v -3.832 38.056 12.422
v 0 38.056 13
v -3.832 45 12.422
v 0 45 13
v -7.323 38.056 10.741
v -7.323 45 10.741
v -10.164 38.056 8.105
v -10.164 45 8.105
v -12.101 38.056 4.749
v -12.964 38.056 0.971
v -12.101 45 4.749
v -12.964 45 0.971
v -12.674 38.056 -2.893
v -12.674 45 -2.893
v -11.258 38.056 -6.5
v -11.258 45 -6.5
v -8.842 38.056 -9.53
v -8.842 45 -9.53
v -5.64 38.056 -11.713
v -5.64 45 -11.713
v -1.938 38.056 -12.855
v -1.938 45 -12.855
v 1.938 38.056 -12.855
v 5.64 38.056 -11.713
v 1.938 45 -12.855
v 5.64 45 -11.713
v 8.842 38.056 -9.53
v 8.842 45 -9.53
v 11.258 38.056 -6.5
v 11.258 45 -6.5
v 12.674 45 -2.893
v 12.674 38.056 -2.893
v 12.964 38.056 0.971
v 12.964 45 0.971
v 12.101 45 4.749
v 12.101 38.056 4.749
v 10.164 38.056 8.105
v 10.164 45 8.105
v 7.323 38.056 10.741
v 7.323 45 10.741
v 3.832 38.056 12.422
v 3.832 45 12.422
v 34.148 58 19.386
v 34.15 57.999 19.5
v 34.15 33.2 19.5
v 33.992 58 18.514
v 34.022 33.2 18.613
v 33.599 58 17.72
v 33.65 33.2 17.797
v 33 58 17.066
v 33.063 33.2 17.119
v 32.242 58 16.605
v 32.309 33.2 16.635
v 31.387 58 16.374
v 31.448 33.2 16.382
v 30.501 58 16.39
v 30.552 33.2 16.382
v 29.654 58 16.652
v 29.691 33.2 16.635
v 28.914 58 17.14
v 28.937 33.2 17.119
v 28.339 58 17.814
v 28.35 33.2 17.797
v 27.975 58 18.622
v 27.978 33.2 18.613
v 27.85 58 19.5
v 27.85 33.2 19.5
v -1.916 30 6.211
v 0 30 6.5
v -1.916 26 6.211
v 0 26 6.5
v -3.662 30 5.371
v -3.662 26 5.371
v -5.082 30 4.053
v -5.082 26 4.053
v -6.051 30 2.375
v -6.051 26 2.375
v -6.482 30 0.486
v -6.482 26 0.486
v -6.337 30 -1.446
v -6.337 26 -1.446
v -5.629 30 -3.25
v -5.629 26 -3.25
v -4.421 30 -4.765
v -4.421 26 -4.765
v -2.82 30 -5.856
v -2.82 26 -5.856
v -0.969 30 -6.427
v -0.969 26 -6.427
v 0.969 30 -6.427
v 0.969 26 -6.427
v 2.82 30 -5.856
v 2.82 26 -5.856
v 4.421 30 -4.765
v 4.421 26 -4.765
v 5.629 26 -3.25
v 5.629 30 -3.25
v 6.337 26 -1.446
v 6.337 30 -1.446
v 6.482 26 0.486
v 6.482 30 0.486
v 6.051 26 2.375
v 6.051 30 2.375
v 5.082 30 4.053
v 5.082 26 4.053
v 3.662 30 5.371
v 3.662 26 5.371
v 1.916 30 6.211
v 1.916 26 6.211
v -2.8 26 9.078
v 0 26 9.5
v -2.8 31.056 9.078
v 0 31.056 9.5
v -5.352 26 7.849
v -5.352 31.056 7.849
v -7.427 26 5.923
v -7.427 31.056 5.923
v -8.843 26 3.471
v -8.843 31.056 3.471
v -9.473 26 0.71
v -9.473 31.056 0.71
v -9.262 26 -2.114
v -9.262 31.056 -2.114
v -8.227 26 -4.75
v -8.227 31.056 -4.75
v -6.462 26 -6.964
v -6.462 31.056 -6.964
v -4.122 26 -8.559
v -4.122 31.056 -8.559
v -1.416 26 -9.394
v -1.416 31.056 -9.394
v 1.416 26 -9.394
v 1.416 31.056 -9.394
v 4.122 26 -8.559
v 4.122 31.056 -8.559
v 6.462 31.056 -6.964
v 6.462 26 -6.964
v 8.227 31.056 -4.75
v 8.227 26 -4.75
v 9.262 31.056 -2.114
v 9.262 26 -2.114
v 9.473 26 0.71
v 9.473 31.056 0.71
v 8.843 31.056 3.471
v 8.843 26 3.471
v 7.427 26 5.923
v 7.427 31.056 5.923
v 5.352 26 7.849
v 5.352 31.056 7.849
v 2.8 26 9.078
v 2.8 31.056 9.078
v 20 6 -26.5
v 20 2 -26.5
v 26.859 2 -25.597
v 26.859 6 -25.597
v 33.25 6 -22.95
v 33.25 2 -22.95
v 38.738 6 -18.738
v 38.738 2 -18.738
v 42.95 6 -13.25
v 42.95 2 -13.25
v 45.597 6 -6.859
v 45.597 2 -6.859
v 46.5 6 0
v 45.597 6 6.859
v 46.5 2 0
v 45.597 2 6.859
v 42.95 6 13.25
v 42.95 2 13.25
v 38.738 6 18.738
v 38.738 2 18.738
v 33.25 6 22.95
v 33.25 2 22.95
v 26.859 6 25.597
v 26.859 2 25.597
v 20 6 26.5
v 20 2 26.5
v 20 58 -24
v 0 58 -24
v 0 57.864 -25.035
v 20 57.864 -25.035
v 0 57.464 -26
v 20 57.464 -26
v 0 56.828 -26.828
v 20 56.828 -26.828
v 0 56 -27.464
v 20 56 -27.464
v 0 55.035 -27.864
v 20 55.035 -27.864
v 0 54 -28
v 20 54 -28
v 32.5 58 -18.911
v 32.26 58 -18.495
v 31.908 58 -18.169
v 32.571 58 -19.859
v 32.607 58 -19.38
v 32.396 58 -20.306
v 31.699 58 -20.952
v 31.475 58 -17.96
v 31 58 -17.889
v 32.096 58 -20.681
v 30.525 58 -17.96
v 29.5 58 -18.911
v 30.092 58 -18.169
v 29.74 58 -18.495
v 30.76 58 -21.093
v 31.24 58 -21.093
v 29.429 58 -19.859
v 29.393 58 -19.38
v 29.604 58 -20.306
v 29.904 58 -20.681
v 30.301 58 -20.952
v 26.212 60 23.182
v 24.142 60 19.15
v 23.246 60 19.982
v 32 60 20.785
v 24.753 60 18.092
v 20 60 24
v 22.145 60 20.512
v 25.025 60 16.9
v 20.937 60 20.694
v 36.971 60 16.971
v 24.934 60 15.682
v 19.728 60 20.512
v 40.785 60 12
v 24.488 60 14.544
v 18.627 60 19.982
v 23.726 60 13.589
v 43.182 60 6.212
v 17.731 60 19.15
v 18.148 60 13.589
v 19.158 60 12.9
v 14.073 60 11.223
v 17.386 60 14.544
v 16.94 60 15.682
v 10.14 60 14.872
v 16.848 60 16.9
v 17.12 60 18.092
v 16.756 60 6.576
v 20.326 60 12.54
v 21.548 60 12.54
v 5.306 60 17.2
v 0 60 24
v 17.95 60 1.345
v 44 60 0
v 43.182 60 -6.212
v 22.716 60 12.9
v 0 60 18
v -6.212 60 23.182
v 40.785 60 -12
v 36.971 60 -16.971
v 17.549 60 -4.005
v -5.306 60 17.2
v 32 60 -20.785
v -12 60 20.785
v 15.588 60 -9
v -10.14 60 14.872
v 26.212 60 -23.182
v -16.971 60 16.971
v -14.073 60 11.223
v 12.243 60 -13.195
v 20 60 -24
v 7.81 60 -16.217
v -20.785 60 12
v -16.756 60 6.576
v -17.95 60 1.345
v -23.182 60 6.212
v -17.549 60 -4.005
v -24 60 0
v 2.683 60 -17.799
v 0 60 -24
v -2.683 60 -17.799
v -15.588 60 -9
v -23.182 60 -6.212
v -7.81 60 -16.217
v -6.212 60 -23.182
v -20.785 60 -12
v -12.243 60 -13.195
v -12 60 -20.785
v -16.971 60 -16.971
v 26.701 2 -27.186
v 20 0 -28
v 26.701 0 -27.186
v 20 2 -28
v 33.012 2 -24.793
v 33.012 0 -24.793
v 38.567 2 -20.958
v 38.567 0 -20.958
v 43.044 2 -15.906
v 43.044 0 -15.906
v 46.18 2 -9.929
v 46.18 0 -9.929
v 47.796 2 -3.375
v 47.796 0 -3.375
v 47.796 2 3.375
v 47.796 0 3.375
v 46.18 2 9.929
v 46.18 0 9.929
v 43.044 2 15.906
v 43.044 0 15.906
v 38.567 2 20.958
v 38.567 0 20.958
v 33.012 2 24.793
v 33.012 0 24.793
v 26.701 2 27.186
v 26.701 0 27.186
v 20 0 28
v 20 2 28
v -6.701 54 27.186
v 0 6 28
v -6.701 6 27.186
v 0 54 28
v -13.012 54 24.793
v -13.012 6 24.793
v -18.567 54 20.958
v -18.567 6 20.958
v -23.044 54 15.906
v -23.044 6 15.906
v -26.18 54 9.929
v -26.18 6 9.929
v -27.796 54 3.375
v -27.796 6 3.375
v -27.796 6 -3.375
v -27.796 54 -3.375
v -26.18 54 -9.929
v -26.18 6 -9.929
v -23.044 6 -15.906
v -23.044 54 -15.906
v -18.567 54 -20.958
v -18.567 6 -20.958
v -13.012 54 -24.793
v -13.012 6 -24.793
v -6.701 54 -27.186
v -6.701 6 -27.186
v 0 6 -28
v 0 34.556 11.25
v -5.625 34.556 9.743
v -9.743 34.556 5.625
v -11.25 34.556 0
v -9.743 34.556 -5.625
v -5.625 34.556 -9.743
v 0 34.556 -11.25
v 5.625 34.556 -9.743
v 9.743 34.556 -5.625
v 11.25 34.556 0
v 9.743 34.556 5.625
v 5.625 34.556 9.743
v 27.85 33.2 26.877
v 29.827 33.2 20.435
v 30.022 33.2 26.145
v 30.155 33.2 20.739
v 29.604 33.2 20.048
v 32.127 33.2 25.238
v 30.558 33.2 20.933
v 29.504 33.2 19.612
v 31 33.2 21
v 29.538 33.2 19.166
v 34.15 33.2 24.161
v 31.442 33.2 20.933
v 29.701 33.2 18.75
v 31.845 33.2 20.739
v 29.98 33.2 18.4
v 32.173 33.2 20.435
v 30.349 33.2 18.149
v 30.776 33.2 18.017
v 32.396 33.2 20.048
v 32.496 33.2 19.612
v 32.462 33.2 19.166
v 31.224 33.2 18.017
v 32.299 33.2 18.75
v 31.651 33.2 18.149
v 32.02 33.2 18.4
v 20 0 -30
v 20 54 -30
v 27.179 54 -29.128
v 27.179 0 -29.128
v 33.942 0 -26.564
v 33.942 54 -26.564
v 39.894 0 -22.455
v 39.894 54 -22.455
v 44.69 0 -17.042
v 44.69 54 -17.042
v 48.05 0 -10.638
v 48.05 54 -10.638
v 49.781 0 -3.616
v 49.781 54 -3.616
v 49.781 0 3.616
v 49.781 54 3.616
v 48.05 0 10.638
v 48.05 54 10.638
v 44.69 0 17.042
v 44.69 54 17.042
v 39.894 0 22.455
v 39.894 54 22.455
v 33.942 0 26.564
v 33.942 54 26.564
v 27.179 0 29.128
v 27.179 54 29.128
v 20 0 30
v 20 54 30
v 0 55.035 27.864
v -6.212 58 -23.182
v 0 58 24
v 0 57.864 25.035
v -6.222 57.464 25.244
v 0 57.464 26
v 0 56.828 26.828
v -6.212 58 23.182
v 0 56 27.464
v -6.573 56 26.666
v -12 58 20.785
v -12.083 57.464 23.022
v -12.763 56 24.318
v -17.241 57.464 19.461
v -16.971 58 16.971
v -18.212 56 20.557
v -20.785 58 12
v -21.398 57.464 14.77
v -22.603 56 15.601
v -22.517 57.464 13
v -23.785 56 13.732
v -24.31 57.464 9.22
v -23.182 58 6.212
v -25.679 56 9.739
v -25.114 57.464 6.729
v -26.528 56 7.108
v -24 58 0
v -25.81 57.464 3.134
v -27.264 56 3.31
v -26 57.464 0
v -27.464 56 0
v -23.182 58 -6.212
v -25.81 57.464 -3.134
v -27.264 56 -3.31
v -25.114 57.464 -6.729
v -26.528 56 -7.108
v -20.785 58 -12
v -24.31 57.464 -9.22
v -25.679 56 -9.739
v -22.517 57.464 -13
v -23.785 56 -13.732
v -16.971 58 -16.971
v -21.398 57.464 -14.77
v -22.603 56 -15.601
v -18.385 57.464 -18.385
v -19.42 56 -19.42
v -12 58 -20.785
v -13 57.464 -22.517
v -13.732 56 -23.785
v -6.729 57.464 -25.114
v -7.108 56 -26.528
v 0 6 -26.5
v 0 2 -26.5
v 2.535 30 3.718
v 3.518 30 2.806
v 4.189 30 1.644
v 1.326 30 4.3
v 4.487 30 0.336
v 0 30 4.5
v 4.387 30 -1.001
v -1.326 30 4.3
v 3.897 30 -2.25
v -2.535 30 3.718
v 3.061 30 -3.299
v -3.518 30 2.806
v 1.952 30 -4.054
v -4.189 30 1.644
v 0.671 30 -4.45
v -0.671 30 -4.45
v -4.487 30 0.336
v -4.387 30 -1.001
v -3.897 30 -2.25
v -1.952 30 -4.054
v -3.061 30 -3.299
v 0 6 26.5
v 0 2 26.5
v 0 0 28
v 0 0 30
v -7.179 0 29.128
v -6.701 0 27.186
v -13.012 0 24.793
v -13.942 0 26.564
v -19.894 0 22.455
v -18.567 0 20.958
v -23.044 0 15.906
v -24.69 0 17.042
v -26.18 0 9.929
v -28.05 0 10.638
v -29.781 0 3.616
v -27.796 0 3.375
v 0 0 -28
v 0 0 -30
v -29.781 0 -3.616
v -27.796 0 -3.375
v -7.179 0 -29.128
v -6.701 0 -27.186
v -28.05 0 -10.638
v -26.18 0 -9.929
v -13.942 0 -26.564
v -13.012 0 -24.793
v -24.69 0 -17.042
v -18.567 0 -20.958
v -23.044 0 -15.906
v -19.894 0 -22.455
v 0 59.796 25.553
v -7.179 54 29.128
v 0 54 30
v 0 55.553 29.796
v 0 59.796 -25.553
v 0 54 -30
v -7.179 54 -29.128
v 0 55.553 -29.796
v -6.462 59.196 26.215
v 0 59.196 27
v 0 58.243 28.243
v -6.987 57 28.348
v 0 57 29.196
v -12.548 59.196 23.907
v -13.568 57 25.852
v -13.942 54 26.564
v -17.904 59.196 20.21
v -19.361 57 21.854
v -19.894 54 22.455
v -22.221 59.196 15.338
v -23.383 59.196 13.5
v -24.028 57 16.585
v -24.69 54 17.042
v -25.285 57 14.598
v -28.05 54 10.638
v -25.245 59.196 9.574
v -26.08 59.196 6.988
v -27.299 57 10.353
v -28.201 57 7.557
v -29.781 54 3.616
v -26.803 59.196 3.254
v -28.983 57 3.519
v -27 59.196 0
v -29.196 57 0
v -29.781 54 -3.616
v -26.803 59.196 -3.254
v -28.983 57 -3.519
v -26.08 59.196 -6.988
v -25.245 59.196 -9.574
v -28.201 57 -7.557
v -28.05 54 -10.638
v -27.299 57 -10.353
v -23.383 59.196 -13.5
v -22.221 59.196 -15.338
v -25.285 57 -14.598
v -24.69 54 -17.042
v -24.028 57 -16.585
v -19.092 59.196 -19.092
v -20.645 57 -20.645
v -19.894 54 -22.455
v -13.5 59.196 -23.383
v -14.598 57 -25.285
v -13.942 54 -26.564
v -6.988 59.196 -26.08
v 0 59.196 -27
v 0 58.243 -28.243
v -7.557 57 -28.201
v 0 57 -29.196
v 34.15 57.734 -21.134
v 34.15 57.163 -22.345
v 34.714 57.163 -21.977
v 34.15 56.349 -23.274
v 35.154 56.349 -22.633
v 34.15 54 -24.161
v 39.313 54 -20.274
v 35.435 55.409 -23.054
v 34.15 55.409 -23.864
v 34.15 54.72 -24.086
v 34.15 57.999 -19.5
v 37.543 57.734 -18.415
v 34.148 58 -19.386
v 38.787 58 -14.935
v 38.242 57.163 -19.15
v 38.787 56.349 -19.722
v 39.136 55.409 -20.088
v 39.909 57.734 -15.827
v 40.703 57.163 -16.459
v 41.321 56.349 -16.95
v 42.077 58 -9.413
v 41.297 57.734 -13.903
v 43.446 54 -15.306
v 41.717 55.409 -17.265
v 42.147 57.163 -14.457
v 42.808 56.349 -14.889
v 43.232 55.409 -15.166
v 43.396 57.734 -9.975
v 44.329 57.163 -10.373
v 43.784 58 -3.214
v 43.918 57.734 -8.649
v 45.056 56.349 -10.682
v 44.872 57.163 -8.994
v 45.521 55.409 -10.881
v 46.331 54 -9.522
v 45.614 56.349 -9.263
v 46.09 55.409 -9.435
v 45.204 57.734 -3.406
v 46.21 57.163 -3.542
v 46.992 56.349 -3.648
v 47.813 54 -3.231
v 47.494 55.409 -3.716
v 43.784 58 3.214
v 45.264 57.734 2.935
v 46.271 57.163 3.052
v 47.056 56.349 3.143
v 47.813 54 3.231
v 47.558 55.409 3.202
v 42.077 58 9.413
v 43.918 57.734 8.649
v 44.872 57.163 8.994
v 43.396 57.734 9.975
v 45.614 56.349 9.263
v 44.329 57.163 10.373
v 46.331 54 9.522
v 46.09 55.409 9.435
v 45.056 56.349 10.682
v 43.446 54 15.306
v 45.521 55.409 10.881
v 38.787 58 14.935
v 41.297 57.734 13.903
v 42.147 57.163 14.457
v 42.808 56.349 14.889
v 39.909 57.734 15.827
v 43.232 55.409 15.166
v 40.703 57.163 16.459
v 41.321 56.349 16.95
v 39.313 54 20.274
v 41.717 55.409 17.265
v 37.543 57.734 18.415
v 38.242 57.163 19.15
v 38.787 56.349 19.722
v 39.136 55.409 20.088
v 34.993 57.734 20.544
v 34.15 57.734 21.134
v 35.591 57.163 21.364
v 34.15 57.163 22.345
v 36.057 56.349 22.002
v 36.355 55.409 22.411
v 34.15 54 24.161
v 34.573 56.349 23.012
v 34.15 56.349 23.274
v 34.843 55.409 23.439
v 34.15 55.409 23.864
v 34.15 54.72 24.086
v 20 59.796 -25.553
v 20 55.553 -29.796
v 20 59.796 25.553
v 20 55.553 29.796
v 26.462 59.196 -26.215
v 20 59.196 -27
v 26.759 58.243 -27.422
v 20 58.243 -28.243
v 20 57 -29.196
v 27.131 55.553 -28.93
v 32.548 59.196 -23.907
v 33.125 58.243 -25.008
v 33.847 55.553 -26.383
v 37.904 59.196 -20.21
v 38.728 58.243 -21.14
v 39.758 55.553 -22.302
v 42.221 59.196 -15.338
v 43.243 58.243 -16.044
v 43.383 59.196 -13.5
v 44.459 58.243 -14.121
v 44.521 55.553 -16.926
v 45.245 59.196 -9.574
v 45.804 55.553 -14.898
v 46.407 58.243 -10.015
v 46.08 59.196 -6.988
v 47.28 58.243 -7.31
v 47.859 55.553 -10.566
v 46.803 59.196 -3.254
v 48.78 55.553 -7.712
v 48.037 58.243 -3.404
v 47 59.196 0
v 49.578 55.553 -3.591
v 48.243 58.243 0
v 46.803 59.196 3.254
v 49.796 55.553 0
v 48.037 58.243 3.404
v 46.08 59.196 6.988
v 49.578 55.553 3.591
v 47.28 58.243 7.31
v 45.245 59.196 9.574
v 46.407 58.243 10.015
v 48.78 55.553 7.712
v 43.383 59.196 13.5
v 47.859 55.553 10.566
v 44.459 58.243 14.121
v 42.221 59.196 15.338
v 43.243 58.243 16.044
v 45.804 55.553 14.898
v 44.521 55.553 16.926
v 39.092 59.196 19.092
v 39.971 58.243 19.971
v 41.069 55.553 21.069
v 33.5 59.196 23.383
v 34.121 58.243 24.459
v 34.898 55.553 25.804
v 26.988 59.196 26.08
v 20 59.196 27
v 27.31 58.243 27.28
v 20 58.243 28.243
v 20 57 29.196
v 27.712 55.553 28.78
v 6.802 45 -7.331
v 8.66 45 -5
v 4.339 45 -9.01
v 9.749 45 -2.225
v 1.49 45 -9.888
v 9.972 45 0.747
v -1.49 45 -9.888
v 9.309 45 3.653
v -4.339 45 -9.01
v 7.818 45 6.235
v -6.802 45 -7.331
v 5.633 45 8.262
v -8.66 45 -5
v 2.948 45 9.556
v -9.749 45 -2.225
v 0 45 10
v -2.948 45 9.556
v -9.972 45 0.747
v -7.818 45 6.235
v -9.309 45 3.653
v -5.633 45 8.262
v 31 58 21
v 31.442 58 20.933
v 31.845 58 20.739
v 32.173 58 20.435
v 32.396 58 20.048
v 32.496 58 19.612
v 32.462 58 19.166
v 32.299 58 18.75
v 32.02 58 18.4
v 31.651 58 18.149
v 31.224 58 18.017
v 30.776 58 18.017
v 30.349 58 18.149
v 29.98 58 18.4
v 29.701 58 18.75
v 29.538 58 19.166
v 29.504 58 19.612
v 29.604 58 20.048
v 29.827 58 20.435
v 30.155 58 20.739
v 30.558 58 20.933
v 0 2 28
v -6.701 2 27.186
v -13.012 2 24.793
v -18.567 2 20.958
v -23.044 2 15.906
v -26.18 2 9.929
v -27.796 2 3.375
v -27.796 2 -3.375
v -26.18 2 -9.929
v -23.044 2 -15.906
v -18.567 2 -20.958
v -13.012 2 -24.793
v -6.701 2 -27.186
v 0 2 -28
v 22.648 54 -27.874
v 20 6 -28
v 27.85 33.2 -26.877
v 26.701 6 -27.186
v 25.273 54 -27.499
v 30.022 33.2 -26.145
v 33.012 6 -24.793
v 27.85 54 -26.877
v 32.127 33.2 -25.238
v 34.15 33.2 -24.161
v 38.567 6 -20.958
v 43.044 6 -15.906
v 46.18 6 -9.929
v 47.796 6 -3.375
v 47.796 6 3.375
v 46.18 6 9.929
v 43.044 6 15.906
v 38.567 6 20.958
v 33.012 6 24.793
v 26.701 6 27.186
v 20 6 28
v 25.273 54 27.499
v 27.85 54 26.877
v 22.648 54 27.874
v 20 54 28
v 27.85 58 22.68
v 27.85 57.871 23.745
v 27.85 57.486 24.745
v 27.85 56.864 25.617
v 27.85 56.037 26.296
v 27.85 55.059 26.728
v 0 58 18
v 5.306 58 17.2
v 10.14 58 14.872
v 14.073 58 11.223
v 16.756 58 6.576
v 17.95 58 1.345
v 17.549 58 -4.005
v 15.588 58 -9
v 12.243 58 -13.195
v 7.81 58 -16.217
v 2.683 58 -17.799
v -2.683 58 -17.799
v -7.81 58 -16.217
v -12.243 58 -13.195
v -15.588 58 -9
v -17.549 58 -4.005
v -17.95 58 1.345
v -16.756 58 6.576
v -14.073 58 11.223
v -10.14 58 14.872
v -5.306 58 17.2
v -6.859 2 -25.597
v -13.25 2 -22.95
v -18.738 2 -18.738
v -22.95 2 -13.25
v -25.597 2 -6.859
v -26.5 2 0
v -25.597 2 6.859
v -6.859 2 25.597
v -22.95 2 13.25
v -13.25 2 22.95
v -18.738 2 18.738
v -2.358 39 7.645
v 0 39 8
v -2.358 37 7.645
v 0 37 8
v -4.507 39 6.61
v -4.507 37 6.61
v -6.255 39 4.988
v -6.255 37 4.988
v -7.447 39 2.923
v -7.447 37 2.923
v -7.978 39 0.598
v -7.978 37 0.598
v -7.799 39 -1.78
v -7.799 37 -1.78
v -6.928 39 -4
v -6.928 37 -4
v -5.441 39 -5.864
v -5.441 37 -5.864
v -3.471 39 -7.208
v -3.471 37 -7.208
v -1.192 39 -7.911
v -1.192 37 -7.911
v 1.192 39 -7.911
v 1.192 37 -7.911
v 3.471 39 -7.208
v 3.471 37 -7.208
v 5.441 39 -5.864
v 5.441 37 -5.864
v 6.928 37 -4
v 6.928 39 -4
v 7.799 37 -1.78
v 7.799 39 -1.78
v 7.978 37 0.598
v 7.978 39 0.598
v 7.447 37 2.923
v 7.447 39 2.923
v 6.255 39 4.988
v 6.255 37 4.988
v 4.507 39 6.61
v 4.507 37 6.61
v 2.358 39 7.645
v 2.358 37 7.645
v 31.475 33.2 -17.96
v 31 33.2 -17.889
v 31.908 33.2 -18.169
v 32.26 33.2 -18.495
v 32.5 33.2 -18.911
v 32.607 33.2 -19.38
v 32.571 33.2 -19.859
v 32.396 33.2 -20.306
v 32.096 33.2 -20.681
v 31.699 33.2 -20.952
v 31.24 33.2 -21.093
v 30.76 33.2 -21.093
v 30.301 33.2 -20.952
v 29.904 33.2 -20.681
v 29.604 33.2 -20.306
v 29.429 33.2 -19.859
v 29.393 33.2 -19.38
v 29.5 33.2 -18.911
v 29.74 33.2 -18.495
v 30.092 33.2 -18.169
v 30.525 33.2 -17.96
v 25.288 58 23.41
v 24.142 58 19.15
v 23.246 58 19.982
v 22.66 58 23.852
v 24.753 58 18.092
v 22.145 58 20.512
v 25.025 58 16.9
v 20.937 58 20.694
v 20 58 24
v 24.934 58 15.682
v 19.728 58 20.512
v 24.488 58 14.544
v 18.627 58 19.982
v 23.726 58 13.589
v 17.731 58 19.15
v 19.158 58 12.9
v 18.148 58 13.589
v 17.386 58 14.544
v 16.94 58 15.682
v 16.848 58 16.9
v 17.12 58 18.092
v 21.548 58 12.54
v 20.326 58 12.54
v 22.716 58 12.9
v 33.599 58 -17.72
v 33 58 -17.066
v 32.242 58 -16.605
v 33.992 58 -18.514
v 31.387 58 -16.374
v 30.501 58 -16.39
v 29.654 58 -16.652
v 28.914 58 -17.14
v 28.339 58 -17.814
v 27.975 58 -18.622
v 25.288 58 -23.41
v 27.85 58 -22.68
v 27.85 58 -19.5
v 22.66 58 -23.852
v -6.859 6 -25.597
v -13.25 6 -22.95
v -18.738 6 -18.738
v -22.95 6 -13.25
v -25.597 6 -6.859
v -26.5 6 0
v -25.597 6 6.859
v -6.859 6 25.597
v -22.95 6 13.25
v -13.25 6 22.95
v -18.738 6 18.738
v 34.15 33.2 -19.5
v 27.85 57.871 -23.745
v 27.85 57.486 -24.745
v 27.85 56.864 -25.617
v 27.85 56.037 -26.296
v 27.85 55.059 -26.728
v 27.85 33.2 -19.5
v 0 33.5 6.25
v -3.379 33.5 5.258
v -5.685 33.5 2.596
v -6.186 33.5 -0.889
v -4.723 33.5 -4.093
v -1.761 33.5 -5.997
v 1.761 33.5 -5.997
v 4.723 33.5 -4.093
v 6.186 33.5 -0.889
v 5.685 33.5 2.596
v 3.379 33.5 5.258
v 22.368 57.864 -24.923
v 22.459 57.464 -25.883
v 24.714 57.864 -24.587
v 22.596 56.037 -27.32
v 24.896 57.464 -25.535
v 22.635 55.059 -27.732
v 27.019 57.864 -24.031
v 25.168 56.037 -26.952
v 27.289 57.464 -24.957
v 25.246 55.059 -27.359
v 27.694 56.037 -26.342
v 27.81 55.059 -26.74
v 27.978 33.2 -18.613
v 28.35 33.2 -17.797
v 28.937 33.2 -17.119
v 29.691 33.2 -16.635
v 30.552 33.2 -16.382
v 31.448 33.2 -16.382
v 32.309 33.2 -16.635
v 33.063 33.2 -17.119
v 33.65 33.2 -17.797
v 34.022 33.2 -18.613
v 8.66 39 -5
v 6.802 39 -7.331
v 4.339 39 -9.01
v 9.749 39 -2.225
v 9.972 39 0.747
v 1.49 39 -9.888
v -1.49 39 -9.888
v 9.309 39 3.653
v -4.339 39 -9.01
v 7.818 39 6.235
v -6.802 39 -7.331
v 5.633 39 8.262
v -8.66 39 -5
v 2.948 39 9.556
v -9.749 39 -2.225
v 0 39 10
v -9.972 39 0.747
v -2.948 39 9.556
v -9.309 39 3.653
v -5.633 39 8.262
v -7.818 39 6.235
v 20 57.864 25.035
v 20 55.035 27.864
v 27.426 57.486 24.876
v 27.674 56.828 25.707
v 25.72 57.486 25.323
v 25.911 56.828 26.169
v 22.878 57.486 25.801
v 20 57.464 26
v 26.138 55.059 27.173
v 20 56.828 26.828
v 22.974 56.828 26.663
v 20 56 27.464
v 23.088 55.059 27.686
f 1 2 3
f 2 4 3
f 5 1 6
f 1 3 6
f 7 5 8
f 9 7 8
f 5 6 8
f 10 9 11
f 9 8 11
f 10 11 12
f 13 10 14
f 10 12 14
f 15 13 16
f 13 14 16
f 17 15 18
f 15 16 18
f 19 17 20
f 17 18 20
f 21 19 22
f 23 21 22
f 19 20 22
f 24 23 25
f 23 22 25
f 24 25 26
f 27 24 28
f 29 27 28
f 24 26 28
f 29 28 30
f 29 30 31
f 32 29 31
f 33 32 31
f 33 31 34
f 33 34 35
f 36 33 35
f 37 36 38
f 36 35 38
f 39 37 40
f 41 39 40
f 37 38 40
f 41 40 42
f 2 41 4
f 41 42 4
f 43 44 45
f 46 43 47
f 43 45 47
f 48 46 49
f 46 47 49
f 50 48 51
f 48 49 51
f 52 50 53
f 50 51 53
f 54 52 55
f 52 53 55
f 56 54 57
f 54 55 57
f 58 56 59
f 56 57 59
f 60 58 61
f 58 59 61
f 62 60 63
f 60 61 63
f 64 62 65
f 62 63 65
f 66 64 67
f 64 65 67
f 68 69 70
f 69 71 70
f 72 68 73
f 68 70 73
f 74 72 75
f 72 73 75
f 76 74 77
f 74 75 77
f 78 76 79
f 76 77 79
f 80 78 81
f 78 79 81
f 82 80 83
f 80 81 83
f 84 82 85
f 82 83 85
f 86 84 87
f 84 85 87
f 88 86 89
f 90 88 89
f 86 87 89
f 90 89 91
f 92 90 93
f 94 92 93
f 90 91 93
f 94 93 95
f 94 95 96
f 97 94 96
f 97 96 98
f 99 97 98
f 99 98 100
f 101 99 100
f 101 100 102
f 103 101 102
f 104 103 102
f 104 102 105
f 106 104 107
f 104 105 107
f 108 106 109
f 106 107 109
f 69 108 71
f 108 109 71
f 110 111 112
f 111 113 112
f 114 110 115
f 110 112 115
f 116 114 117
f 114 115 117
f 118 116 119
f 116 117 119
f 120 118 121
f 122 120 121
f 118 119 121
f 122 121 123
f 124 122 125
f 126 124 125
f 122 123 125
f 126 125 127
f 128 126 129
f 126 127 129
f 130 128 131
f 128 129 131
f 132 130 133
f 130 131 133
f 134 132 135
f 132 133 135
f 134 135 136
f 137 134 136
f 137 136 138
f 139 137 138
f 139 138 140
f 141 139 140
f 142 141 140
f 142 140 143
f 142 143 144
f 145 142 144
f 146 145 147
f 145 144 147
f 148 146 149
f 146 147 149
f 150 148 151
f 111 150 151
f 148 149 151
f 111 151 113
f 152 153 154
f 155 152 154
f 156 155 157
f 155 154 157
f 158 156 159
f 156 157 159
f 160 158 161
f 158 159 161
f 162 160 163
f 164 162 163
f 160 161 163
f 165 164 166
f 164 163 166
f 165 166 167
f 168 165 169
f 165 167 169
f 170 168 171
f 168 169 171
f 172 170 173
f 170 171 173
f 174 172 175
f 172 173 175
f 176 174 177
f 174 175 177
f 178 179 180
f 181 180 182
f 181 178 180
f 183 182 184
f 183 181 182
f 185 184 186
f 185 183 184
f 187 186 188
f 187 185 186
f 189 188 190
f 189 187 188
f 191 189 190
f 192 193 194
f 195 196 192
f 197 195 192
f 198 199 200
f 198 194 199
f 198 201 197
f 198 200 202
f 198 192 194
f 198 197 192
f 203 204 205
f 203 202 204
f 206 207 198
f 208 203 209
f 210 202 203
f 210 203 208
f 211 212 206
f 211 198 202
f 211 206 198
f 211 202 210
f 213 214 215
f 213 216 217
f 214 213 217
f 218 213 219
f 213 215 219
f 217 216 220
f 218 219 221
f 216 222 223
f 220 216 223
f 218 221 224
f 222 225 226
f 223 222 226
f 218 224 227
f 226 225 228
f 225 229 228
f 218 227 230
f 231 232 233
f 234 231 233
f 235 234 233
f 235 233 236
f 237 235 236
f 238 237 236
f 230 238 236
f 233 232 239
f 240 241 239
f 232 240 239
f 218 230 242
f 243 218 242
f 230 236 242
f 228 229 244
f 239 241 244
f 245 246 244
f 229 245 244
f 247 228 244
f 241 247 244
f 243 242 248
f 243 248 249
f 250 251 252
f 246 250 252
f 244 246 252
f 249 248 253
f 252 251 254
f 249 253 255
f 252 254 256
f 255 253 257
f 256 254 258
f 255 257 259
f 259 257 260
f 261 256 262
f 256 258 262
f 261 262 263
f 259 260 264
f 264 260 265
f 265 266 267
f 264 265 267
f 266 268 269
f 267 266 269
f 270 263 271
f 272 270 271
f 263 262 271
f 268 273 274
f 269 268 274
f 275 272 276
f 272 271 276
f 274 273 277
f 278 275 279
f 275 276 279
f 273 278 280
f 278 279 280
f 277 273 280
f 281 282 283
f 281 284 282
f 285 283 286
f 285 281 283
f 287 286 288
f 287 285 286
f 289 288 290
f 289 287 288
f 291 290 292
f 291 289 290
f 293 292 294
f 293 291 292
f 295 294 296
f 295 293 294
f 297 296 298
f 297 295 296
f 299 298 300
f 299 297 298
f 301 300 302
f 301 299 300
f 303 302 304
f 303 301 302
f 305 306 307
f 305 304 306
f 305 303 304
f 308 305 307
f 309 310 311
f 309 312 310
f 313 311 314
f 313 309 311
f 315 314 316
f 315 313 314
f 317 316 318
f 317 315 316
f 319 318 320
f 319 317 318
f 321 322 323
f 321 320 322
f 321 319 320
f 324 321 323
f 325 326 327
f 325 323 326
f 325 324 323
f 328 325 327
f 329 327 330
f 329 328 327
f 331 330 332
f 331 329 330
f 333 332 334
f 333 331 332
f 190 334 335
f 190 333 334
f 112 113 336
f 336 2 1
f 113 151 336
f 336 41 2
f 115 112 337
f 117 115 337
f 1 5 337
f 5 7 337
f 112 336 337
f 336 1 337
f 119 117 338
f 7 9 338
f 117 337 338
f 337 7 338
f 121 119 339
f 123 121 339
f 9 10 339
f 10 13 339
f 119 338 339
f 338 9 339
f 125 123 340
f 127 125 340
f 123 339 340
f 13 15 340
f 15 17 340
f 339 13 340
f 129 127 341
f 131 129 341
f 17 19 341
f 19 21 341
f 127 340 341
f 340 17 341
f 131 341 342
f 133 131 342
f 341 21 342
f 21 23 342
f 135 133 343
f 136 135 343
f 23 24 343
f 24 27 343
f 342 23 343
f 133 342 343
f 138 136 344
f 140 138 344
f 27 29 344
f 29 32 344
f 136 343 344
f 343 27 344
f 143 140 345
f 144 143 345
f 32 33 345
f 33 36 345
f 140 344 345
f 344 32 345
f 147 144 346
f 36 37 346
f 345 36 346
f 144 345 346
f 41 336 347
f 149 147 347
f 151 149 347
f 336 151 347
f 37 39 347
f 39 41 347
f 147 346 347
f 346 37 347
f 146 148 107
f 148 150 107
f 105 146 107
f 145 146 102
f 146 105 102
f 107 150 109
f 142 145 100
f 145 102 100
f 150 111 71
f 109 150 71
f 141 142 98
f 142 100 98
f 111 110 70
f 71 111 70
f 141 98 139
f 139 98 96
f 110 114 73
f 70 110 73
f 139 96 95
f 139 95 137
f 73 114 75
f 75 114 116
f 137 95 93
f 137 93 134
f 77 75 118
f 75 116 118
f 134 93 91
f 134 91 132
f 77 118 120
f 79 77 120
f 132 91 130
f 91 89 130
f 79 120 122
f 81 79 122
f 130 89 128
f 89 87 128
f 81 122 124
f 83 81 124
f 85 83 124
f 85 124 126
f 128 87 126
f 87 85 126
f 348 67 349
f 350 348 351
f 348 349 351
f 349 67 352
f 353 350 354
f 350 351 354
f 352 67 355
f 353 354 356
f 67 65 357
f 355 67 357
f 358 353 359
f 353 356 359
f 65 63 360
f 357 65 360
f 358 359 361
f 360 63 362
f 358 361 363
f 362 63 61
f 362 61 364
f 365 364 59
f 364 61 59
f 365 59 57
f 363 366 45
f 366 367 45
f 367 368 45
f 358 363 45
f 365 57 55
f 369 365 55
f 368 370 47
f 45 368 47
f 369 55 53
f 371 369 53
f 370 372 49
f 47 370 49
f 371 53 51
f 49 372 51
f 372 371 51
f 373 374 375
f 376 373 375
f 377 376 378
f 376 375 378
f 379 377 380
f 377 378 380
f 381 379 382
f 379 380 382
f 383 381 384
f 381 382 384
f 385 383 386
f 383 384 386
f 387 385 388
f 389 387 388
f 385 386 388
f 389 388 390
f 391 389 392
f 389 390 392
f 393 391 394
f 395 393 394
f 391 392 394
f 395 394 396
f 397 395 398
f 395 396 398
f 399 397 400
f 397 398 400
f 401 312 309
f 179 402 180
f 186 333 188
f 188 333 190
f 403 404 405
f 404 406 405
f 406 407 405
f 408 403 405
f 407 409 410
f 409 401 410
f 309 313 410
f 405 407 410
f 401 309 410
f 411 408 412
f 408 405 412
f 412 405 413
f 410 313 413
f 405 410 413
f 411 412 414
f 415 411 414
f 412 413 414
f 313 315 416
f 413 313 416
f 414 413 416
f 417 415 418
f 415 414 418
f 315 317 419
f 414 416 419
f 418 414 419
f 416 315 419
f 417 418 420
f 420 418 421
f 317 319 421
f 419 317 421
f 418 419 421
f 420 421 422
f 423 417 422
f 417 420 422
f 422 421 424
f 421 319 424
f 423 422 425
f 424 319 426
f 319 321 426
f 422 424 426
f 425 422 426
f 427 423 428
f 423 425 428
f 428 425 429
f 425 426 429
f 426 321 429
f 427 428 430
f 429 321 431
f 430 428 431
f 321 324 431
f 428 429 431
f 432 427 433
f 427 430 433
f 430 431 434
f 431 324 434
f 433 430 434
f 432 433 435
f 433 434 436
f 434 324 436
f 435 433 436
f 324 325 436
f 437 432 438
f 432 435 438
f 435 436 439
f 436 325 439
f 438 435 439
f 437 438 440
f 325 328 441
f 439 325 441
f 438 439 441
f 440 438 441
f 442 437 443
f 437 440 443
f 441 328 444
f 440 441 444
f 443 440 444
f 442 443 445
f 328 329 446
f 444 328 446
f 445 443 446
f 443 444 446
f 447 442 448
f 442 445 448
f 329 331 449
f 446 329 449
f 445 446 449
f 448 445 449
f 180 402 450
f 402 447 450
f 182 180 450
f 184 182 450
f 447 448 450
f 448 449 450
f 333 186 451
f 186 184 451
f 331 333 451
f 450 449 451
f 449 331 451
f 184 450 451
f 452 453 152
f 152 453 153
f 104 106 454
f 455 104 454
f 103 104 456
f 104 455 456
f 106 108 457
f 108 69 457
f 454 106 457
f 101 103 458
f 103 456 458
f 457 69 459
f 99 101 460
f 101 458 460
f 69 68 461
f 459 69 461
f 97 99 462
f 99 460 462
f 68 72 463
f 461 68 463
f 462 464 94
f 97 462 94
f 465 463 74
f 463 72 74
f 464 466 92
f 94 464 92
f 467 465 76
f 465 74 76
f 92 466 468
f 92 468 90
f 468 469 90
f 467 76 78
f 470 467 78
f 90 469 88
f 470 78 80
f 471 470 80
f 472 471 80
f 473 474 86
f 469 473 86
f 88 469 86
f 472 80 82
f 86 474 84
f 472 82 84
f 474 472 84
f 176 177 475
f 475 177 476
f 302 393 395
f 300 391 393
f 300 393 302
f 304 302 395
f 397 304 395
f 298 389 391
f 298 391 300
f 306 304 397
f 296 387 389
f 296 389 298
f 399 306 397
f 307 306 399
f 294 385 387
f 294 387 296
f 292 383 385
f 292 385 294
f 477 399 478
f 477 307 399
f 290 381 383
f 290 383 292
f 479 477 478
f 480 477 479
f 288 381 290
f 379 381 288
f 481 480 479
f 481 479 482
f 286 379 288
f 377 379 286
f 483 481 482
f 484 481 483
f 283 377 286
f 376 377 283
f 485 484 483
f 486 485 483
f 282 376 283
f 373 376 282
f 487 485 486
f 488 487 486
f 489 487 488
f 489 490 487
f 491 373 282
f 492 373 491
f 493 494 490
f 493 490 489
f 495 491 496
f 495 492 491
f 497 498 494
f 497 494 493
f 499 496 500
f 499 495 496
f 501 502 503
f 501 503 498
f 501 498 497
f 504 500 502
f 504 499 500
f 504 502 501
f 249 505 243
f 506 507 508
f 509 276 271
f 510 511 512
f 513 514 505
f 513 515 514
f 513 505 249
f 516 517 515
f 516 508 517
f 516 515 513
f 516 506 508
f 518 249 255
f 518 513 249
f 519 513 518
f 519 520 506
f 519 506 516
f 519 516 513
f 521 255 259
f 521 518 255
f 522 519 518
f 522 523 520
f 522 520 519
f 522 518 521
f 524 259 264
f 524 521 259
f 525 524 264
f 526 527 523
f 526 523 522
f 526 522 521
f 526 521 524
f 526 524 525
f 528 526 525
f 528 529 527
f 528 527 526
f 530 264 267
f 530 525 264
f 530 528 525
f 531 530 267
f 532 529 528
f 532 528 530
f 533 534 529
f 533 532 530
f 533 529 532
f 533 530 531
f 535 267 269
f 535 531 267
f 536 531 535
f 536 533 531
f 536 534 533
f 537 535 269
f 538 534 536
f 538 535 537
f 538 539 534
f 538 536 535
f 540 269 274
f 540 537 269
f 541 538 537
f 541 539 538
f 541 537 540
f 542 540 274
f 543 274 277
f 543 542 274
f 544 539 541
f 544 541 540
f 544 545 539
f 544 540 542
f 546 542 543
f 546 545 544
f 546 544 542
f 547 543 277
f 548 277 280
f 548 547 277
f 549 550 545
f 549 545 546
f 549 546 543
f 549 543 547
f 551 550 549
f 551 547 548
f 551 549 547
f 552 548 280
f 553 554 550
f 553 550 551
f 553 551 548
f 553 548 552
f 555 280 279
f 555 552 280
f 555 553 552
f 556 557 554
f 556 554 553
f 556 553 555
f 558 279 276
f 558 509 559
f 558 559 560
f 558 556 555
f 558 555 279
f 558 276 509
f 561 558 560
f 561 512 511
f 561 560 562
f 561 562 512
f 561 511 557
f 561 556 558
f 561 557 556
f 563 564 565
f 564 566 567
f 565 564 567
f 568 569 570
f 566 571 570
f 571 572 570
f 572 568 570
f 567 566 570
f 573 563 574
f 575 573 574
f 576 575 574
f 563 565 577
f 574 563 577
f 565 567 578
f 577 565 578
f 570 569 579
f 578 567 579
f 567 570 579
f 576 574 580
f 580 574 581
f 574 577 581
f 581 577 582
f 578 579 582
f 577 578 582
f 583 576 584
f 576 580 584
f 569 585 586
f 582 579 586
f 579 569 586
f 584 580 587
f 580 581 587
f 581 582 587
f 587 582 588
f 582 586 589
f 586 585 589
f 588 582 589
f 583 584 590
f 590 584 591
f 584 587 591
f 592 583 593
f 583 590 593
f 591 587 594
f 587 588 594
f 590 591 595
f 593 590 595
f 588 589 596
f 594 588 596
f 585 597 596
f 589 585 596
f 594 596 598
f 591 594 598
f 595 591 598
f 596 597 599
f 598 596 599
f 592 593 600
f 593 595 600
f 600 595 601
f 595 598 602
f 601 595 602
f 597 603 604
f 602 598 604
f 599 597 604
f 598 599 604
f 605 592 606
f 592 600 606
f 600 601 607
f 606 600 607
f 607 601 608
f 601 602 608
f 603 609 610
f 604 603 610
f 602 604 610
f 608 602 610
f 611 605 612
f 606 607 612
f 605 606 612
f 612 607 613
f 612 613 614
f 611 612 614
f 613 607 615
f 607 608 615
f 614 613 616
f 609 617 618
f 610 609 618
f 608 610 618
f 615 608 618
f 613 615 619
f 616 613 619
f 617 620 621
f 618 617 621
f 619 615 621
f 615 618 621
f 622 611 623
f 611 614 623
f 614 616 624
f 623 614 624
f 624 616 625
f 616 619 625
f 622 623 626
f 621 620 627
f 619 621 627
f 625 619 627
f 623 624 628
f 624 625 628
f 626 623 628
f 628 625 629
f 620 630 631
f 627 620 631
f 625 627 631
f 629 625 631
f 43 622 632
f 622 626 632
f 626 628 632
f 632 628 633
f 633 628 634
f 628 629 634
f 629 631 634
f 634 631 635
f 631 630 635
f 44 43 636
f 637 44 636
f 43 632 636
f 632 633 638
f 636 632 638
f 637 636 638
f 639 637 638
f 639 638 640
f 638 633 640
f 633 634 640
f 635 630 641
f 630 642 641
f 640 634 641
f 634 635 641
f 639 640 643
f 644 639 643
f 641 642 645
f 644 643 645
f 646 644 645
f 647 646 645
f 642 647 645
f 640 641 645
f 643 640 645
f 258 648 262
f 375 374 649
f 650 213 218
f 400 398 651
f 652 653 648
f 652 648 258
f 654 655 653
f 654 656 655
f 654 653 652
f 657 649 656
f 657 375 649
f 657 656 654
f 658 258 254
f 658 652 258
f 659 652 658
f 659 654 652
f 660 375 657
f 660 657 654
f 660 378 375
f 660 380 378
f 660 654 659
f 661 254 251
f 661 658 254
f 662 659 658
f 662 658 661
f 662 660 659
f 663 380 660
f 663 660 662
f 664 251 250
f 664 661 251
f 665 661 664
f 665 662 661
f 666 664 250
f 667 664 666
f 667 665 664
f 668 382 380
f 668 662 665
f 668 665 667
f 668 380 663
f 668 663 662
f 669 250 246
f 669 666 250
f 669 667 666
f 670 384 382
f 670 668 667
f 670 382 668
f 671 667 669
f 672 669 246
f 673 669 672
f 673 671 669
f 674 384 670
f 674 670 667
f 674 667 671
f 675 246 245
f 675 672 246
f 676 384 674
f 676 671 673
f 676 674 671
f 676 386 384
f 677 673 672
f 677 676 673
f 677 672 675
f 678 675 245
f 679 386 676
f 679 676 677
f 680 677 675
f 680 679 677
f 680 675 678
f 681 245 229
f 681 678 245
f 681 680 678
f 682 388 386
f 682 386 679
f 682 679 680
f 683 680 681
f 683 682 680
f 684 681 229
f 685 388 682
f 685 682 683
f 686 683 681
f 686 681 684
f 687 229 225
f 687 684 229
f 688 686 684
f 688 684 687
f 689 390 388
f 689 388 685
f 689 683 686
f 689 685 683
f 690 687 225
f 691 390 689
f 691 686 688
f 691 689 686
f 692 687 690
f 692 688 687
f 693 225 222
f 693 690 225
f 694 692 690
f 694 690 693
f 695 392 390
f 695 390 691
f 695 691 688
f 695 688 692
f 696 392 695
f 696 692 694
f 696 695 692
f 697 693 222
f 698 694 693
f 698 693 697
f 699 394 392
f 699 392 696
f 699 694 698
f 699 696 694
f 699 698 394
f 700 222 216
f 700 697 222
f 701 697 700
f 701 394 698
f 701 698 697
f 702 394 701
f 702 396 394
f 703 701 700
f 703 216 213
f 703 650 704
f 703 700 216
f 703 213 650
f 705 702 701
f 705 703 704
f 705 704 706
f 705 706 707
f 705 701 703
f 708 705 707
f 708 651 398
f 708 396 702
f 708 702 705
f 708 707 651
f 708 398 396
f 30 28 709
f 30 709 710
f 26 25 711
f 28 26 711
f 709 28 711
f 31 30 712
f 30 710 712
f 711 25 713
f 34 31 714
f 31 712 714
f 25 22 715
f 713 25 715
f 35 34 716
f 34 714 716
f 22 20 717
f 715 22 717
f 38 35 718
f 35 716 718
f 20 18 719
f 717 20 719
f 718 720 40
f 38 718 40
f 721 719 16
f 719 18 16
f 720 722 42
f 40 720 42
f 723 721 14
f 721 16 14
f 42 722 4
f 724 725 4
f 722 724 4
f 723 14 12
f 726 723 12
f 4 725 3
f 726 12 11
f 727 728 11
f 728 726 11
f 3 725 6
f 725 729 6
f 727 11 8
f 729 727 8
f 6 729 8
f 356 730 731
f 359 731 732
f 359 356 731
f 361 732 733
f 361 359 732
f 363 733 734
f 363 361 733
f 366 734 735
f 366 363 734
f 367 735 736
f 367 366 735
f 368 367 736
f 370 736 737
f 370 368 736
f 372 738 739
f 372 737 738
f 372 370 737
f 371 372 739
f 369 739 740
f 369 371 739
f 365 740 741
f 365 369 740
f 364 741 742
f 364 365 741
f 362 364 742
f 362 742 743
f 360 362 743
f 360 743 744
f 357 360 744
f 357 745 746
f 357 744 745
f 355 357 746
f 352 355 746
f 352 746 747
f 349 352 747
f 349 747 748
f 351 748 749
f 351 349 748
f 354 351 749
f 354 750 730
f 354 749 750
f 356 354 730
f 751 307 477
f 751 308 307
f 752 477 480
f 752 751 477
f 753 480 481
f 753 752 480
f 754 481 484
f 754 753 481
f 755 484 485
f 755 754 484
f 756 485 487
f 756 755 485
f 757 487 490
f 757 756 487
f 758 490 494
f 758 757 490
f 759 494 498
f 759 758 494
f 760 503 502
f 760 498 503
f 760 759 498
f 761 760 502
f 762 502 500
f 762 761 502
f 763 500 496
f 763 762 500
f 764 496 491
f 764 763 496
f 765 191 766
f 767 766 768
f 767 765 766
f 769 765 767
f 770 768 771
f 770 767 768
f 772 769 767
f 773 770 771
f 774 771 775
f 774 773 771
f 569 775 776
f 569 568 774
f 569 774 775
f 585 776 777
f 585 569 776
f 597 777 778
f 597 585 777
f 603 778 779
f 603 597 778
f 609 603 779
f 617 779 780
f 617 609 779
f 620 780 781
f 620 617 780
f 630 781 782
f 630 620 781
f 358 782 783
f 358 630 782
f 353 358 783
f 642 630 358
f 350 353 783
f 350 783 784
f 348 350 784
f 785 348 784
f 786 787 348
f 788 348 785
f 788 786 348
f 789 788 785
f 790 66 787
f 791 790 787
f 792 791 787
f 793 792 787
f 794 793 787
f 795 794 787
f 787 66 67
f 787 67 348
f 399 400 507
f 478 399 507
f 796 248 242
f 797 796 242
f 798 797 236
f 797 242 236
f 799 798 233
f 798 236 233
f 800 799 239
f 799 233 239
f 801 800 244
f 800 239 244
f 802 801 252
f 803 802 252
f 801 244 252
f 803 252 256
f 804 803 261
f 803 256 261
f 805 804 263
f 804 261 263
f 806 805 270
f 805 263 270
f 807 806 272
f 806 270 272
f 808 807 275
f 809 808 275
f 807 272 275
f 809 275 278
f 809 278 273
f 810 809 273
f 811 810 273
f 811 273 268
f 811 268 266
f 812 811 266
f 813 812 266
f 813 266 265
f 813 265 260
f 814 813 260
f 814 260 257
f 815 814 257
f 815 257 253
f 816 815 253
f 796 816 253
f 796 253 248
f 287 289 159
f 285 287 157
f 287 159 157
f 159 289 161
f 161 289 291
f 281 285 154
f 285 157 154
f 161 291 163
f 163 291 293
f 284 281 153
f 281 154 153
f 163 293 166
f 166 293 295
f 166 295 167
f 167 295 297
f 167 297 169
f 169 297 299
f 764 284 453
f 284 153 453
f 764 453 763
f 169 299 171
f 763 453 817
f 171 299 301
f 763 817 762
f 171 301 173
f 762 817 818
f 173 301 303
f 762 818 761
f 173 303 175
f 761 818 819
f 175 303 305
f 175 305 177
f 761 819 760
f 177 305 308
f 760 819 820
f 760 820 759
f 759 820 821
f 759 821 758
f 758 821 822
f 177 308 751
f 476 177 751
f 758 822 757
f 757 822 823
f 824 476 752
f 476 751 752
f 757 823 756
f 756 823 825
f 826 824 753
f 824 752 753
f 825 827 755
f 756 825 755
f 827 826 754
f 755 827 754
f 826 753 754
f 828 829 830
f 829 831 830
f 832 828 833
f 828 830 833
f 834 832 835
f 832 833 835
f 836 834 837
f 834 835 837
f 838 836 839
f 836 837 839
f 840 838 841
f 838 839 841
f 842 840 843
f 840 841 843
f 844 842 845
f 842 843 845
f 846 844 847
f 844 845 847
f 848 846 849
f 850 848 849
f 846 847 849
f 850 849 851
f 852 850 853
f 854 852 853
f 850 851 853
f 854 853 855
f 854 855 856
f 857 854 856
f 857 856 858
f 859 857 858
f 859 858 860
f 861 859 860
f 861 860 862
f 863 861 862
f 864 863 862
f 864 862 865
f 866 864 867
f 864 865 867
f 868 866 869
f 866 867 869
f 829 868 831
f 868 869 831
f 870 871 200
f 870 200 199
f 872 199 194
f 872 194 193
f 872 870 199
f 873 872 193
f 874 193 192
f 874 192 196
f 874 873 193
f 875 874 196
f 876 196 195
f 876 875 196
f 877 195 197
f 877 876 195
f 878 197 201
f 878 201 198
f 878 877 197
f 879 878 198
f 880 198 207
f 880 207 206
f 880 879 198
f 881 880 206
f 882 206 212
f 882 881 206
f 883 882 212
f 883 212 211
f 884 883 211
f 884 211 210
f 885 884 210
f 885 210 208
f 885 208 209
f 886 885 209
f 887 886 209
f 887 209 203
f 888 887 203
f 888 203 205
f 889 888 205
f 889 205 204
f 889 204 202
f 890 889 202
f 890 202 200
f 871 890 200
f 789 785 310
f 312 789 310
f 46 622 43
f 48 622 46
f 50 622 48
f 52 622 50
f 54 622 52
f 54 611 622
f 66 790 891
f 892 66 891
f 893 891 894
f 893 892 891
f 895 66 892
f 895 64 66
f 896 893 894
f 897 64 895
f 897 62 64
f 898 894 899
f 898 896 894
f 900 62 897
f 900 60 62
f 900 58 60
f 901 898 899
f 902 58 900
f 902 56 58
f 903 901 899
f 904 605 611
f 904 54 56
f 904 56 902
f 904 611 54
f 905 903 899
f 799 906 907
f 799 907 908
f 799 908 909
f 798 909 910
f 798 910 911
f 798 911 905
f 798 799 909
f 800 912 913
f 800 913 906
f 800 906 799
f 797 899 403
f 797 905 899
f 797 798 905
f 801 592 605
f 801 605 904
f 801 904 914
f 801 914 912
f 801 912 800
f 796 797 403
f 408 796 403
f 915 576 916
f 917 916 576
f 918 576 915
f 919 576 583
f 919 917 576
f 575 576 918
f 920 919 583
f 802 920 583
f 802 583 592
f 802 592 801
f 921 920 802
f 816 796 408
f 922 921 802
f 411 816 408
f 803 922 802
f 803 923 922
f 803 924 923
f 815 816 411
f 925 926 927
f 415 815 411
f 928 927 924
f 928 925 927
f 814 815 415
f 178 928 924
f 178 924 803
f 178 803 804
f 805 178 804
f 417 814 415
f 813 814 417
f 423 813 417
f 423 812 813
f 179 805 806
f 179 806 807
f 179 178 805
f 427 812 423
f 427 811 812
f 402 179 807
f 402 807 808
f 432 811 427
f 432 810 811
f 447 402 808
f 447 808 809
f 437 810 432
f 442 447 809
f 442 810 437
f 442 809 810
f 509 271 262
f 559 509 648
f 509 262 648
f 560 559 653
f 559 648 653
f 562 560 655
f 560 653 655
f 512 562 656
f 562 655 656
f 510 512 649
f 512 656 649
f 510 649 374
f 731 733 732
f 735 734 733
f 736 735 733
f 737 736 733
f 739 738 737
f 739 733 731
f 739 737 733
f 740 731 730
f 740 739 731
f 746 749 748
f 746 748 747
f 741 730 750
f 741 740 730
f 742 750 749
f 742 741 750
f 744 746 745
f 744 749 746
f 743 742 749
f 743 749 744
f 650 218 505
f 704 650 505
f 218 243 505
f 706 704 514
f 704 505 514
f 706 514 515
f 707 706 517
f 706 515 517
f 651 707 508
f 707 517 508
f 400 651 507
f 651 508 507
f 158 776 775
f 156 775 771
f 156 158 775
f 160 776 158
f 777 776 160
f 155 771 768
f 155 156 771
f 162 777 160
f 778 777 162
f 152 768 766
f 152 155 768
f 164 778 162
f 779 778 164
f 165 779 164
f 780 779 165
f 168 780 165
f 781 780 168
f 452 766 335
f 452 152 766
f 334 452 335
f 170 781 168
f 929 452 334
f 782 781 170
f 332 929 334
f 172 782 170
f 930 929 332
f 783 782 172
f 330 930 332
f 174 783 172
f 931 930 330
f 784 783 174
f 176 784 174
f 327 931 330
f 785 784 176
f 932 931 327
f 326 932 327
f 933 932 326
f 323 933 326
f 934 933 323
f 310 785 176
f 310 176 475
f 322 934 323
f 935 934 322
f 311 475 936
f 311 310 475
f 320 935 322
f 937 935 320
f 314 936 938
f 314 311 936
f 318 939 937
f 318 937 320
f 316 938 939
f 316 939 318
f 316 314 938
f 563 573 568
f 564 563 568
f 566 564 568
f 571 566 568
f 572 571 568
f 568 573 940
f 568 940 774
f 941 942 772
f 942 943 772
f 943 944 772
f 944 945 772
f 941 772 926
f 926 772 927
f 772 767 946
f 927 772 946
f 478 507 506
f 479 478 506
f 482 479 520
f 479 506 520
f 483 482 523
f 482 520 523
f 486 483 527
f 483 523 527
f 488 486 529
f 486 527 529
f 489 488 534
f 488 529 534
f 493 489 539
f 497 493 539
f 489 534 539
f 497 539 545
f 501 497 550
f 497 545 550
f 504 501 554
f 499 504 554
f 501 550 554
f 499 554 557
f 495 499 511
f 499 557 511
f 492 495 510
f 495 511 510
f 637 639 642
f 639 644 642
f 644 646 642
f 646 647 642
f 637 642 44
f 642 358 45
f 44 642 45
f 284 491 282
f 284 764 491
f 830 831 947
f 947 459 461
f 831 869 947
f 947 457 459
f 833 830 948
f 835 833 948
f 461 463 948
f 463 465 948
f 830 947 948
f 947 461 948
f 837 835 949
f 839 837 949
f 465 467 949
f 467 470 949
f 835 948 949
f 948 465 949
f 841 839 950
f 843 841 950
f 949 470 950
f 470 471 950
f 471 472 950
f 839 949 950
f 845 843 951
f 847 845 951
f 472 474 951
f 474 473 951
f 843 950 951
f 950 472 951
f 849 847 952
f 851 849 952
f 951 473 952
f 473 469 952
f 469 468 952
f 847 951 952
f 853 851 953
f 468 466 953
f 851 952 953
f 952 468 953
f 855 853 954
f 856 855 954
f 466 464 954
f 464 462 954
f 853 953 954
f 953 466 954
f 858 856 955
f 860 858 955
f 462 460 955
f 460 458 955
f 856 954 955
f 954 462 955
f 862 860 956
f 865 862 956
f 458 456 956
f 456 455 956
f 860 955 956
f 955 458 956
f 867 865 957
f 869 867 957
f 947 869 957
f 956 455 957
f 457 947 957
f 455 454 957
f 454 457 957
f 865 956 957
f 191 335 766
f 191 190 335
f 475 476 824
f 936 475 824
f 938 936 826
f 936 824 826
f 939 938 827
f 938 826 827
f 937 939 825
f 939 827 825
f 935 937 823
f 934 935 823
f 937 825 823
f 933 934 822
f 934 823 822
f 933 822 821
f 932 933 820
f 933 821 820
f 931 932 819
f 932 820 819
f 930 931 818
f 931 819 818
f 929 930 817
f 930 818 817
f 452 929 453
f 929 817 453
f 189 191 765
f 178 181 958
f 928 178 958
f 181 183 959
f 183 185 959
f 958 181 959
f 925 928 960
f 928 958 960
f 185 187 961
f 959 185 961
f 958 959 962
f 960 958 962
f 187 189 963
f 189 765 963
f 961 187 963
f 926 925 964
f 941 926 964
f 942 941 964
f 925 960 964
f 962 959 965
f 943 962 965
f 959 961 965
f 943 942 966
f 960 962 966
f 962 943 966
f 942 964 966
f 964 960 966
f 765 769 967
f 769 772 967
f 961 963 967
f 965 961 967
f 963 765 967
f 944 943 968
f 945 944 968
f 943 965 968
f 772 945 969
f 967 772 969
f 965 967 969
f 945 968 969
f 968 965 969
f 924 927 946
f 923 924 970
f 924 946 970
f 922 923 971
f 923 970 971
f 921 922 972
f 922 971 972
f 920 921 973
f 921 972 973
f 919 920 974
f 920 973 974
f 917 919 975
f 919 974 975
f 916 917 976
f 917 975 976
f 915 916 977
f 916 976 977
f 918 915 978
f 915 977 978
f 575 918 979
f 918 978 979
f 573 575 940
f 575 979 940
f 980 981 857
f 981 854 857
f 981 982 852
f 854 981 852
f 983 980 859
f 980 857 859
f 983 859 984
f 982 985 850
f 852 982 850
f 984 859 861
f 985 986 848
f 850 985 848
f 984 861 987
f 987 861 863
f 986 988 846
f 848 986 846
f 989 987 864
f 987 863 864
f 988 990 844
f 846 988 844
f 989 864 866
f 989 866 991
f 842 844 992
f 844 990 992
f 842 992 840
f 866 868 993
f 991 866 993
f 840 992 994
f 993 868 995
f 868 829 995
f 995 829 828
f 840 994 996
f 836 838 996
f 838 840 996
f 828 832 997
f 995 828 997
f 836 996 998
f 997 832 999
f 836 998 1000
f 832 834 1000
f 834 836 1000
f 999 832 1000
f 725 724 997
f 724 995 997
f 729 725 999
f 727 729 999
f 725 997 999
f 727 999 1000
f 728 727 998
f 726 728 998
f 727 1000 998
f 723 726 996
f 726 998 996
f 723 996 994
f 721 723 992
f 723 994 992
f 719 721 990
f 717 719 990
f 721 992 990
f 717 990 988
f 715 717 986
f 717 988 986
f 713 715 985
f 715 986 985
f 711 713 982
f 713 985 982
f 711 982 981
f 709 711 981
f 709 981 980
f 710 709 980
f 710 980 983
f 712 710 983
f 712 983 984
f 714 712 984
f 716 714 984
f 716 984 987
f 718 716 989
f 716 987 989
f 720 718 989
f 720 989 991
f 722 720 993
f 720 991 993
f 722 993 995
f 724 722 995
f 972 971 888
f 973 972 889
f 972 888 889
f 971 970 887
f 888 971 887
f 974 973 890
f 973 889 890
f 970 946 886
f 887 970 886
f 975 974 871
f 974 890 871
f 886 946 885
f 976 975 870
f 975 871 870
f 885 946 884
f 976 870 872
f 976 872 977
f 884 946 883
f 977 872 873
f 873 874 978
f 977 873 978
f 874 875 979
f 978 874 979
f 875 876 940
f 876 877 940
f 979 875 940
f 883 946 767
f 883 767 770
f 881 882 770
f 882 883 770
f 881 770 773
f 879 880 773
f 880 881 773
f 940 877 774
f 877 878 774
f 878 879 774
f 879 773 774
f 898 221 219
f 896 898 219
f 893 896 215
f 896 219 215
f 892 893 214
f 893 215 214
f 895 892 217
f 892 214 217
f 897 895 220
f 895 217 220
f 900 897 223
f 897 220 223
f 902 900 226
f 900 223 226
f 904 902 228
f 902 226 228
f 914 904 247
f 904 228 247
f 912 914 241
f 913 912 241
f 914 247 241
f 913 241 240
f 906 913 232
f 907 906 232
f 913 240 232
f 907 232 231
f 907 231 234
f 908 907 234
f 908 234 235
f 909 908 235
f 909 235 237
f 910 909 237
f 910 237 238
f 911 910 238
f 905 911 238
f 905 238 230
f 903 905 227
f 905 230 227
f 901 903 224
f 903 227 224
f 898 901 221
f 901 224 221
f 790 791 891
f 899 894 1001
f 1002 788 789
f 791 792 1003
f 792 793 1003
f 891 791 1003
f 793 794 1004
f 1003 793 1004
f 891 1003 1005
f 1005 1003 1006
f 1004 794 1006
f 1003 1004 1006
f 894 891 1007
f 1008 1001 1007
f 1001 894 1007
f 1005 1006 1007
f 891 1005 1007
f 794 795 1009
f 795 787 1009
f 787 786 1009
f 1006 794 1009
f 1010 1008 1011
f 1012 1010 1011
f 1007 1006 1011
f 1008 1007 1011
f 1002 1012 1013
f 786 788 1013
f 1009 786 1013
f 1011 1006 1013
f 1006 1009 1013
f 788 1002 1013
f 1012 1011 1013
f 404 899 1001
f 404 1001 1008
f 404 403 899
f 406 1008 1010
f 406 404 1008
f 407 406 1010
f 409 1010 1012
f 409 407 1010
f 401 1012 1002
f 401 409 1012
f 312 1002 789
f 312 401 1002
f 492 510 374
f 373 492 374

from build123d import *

# Parameters (mm, degrees)
EXTRUDE_2_DEPTH      = 60
EXTRUDE_2_DEPTH_BACK = 0.0001
FILLET_2_R           = 6
SHELL_2_T            = -2
CUT_EXTRUDE_1_REACH  = 85.666
SKETCH_3_R           = 18
EXTRUDE_5_REACH      = 69.099
SKETCH_5_R           = 1.5
SKETCH_5_R_2         = 1.611386823
SKETCH_6_R           = 4.1
CUT_EXTRUDE_2_DEPTH  = 2
EXTRUDE_START        = -2
EXTRUDE_6_DEPTH      = 4


with BuildPart() as part:
    # 草图2 → 凸台-拉伸2 (new, two sides)
    with BuildSketch(Plane(origin=(0, 0, 0), x_dir=(1, 0, 0), z_dir=(0, 1, 0))) as extrude_2_sk:
        with BuildLine():
            Line((0, 30), (20, 30))
            ThreePointArc((20, 30), (50, 0), (20, -30))
            Line((20, -30), (0, -30))
            ThreePointArc((0, -30), (-30, 0), (0, 30))
        make_face()
    extrude(amount=EXTRUDE_2_DEPTH)
    extrude(extrude_2_sk.sketch, amount=-EXTRUDE_2_DEPTH_BACK)

    # 圆角2
    fillet_2_edges = [part.edges().sort_by_distance(p)[0] for p in [
        (-30, 60, 0),
        (10, 60, 30),
        (50, 60, 0),
        (10, 60, -30),
    ]]
    fillet(fillet_2_edges, radius=FILLET_2_R)

    # 抽壳2
    shell_2_openings = [part.faces().sort_by_distance(p)[0] for p in [
        (10, -0.0001, 0),
    ]]
    offset(amount=SHELL_2_T, openings=shell_2_openings, kind=Kind.INTERSECTION)

    # 草图3 → 切除-拉伸1 (cut, up to next)
    with BuildSketch(Plane(origin=(0, 60, 0), x_dir=(1, 0, 0), z_dir=(0, 1, 0)), mode=Mode.PRIVATE) as cut_extrude_1_sk1:
        with Locations(Location((0, 0, 0), (0, 0, 270))):
            Circle(SKETCH_3_R)
    cut_extrude_1_tool1 = extrude(cut_extrude_1_sk1.sketch, amount=-CUT_EXTRUDE_1_REACH, mode=Mode.PRIVATE) & part.part
    add(cut_extrude_1_tool1.solids().sort_by_distance((0, 60, 0))[0], mode=Mode.SUBTRACT)

    # 草图5 → 凸台-拉伸5 (add, up to next)
    with BuildSketch(Plane(origin=(0, 33.2, 0), x_dir=(1, 0, 0), z_dir=(0, 1, 0)), mode=Mode.PRIVATE) as extrude_5_sk1:
        with BuildLine():
            Line((34.15, -26.453307922), (34.15, -19.5))
            ThreePointArc((34.15, -19.5), (31, -16.35), (27.85, -19.5))
            Line((27.85, -19.5), (27.85, -28.954749179))
            ThreePointArc((27.85, -28.954749179), (31.070876302, -27.882533922), (34.15, -26.453307922))
        make_face()
        with Locations(Location((31, -19.5, 0), (0, 0, 270))):
            Circle(SKETCH_5_R, mode=Mode.SUBTRACT)
    extrude_5_tool1 = extrude(extrude_5_sk1.sketch, amount=EXTRUDE_5_REACH, mode=Mode.PRIVATE) - part.part
    # 草图5 → 凸台-拉伸5 (add, up to next)
    with BuildSketch(Plane(origin=(0, 33.2, 0), x_dir=(1, 0, 0), z_dir=(0, 1, 0)), mode=Mode.PRIVATE) as extrude_5_sk2:
        with BuildLine():
            Line((34.15, 19.5), (34.15, 26.453307922))
            ThreePointArc((34.15, 26.453307922), (31.070876302, 27.882533922), (27.85, 28.954749179))
            Line((27.85, 28.954749179), (27.85, 19.5))
            ThreePointArc((27.85, 19.5), (31, 16.35), (34.15, 19.5))
        make_face()
        with Locations(Location((31, 19.5, 0), (0, 0, 270))):
            Circle(SKETCH_5_R_2, mode=Mode.SUBTRACT)
    extrude_5_tool2 = extrude(extrude_5_sk2.sketch, amount=EXTRUDE_5_REACH, mode=Mode.PRIVATE) - part.part
    add(extrude_5_tool1.solids().sort_by_distance((30.864931, 33.2, 22.774956))[0])
    add(extrude_5_tool2.solids().sort_by_distance((30.862479, 33.2, -22.834401))[0])

    # 草图6 → 切除-拉伸2 (cut)
    with BuildSketch(Plane(origin=(0, 60, 0), x_dir=(1, 0, 0), z_dir=(0, 1, 0))):
        with Locations(Location((20.936876077, -16.594048798, 0), (0, 0, 270))):
            Circle(SKETCH_6_R)
    extrude(amount=-CUT_EXTRUDE_2_DEPTH, mode=Mode.SUBTRACT)

    # 草图8 → 凸台-拉伸6 (add)
    with BuildSketch(Plane.XZ.offset(0.0001).offset(EXTRUDE_START)):
        with BuildLine():
            Line((20, -28), (0, -28))
            ThreePointArc((0, -28), (-28, 0), (0, 28))
            Line((0, 28), (20, 28))
            ThreePointArc((20, 28), (48, 0), (20, -28))
        make_face()
        with BuildLine():
            ThreePointArc((20, -26.5), (46.5, 0), (20, 26.5))
            Line((20, 26.5), (0, 26.5))
            ThreePointArc((0, 26.5), (-26.5, 0), (0, -26.5))
            Line((0, -26.5), (20, -26.5))
        make_face(mode=Mode.SUBTRACT)
    extrude(amount=-EXTRUDE_6_DEPTH)


with BuildPart() as body_2:
    # 草图4 → 旋转3 (revolve)
    with BuildSketch(Plane.XY, mode=Mode.PRIVATE) as revolve_3_sk:
        Polygon((-10, 45), (-10, 39), (-8, 39), (-8, 37), (-4.5, 30), (-6.5, 30), (-6.5, 26), (-9.5, 26), (-9.5, 31.05572809), (-13, 38.05572809), (-13, 45), align=None)
    revolve(revolve_3_sk.sketch.rotate(Axis((0, 72.773070172, 0), (0, -1, 0)), 270), axis=Axis((0, 72.773070172, 0), (0, -1, 0)))


solid = Compound([part.part, body_2.part])
